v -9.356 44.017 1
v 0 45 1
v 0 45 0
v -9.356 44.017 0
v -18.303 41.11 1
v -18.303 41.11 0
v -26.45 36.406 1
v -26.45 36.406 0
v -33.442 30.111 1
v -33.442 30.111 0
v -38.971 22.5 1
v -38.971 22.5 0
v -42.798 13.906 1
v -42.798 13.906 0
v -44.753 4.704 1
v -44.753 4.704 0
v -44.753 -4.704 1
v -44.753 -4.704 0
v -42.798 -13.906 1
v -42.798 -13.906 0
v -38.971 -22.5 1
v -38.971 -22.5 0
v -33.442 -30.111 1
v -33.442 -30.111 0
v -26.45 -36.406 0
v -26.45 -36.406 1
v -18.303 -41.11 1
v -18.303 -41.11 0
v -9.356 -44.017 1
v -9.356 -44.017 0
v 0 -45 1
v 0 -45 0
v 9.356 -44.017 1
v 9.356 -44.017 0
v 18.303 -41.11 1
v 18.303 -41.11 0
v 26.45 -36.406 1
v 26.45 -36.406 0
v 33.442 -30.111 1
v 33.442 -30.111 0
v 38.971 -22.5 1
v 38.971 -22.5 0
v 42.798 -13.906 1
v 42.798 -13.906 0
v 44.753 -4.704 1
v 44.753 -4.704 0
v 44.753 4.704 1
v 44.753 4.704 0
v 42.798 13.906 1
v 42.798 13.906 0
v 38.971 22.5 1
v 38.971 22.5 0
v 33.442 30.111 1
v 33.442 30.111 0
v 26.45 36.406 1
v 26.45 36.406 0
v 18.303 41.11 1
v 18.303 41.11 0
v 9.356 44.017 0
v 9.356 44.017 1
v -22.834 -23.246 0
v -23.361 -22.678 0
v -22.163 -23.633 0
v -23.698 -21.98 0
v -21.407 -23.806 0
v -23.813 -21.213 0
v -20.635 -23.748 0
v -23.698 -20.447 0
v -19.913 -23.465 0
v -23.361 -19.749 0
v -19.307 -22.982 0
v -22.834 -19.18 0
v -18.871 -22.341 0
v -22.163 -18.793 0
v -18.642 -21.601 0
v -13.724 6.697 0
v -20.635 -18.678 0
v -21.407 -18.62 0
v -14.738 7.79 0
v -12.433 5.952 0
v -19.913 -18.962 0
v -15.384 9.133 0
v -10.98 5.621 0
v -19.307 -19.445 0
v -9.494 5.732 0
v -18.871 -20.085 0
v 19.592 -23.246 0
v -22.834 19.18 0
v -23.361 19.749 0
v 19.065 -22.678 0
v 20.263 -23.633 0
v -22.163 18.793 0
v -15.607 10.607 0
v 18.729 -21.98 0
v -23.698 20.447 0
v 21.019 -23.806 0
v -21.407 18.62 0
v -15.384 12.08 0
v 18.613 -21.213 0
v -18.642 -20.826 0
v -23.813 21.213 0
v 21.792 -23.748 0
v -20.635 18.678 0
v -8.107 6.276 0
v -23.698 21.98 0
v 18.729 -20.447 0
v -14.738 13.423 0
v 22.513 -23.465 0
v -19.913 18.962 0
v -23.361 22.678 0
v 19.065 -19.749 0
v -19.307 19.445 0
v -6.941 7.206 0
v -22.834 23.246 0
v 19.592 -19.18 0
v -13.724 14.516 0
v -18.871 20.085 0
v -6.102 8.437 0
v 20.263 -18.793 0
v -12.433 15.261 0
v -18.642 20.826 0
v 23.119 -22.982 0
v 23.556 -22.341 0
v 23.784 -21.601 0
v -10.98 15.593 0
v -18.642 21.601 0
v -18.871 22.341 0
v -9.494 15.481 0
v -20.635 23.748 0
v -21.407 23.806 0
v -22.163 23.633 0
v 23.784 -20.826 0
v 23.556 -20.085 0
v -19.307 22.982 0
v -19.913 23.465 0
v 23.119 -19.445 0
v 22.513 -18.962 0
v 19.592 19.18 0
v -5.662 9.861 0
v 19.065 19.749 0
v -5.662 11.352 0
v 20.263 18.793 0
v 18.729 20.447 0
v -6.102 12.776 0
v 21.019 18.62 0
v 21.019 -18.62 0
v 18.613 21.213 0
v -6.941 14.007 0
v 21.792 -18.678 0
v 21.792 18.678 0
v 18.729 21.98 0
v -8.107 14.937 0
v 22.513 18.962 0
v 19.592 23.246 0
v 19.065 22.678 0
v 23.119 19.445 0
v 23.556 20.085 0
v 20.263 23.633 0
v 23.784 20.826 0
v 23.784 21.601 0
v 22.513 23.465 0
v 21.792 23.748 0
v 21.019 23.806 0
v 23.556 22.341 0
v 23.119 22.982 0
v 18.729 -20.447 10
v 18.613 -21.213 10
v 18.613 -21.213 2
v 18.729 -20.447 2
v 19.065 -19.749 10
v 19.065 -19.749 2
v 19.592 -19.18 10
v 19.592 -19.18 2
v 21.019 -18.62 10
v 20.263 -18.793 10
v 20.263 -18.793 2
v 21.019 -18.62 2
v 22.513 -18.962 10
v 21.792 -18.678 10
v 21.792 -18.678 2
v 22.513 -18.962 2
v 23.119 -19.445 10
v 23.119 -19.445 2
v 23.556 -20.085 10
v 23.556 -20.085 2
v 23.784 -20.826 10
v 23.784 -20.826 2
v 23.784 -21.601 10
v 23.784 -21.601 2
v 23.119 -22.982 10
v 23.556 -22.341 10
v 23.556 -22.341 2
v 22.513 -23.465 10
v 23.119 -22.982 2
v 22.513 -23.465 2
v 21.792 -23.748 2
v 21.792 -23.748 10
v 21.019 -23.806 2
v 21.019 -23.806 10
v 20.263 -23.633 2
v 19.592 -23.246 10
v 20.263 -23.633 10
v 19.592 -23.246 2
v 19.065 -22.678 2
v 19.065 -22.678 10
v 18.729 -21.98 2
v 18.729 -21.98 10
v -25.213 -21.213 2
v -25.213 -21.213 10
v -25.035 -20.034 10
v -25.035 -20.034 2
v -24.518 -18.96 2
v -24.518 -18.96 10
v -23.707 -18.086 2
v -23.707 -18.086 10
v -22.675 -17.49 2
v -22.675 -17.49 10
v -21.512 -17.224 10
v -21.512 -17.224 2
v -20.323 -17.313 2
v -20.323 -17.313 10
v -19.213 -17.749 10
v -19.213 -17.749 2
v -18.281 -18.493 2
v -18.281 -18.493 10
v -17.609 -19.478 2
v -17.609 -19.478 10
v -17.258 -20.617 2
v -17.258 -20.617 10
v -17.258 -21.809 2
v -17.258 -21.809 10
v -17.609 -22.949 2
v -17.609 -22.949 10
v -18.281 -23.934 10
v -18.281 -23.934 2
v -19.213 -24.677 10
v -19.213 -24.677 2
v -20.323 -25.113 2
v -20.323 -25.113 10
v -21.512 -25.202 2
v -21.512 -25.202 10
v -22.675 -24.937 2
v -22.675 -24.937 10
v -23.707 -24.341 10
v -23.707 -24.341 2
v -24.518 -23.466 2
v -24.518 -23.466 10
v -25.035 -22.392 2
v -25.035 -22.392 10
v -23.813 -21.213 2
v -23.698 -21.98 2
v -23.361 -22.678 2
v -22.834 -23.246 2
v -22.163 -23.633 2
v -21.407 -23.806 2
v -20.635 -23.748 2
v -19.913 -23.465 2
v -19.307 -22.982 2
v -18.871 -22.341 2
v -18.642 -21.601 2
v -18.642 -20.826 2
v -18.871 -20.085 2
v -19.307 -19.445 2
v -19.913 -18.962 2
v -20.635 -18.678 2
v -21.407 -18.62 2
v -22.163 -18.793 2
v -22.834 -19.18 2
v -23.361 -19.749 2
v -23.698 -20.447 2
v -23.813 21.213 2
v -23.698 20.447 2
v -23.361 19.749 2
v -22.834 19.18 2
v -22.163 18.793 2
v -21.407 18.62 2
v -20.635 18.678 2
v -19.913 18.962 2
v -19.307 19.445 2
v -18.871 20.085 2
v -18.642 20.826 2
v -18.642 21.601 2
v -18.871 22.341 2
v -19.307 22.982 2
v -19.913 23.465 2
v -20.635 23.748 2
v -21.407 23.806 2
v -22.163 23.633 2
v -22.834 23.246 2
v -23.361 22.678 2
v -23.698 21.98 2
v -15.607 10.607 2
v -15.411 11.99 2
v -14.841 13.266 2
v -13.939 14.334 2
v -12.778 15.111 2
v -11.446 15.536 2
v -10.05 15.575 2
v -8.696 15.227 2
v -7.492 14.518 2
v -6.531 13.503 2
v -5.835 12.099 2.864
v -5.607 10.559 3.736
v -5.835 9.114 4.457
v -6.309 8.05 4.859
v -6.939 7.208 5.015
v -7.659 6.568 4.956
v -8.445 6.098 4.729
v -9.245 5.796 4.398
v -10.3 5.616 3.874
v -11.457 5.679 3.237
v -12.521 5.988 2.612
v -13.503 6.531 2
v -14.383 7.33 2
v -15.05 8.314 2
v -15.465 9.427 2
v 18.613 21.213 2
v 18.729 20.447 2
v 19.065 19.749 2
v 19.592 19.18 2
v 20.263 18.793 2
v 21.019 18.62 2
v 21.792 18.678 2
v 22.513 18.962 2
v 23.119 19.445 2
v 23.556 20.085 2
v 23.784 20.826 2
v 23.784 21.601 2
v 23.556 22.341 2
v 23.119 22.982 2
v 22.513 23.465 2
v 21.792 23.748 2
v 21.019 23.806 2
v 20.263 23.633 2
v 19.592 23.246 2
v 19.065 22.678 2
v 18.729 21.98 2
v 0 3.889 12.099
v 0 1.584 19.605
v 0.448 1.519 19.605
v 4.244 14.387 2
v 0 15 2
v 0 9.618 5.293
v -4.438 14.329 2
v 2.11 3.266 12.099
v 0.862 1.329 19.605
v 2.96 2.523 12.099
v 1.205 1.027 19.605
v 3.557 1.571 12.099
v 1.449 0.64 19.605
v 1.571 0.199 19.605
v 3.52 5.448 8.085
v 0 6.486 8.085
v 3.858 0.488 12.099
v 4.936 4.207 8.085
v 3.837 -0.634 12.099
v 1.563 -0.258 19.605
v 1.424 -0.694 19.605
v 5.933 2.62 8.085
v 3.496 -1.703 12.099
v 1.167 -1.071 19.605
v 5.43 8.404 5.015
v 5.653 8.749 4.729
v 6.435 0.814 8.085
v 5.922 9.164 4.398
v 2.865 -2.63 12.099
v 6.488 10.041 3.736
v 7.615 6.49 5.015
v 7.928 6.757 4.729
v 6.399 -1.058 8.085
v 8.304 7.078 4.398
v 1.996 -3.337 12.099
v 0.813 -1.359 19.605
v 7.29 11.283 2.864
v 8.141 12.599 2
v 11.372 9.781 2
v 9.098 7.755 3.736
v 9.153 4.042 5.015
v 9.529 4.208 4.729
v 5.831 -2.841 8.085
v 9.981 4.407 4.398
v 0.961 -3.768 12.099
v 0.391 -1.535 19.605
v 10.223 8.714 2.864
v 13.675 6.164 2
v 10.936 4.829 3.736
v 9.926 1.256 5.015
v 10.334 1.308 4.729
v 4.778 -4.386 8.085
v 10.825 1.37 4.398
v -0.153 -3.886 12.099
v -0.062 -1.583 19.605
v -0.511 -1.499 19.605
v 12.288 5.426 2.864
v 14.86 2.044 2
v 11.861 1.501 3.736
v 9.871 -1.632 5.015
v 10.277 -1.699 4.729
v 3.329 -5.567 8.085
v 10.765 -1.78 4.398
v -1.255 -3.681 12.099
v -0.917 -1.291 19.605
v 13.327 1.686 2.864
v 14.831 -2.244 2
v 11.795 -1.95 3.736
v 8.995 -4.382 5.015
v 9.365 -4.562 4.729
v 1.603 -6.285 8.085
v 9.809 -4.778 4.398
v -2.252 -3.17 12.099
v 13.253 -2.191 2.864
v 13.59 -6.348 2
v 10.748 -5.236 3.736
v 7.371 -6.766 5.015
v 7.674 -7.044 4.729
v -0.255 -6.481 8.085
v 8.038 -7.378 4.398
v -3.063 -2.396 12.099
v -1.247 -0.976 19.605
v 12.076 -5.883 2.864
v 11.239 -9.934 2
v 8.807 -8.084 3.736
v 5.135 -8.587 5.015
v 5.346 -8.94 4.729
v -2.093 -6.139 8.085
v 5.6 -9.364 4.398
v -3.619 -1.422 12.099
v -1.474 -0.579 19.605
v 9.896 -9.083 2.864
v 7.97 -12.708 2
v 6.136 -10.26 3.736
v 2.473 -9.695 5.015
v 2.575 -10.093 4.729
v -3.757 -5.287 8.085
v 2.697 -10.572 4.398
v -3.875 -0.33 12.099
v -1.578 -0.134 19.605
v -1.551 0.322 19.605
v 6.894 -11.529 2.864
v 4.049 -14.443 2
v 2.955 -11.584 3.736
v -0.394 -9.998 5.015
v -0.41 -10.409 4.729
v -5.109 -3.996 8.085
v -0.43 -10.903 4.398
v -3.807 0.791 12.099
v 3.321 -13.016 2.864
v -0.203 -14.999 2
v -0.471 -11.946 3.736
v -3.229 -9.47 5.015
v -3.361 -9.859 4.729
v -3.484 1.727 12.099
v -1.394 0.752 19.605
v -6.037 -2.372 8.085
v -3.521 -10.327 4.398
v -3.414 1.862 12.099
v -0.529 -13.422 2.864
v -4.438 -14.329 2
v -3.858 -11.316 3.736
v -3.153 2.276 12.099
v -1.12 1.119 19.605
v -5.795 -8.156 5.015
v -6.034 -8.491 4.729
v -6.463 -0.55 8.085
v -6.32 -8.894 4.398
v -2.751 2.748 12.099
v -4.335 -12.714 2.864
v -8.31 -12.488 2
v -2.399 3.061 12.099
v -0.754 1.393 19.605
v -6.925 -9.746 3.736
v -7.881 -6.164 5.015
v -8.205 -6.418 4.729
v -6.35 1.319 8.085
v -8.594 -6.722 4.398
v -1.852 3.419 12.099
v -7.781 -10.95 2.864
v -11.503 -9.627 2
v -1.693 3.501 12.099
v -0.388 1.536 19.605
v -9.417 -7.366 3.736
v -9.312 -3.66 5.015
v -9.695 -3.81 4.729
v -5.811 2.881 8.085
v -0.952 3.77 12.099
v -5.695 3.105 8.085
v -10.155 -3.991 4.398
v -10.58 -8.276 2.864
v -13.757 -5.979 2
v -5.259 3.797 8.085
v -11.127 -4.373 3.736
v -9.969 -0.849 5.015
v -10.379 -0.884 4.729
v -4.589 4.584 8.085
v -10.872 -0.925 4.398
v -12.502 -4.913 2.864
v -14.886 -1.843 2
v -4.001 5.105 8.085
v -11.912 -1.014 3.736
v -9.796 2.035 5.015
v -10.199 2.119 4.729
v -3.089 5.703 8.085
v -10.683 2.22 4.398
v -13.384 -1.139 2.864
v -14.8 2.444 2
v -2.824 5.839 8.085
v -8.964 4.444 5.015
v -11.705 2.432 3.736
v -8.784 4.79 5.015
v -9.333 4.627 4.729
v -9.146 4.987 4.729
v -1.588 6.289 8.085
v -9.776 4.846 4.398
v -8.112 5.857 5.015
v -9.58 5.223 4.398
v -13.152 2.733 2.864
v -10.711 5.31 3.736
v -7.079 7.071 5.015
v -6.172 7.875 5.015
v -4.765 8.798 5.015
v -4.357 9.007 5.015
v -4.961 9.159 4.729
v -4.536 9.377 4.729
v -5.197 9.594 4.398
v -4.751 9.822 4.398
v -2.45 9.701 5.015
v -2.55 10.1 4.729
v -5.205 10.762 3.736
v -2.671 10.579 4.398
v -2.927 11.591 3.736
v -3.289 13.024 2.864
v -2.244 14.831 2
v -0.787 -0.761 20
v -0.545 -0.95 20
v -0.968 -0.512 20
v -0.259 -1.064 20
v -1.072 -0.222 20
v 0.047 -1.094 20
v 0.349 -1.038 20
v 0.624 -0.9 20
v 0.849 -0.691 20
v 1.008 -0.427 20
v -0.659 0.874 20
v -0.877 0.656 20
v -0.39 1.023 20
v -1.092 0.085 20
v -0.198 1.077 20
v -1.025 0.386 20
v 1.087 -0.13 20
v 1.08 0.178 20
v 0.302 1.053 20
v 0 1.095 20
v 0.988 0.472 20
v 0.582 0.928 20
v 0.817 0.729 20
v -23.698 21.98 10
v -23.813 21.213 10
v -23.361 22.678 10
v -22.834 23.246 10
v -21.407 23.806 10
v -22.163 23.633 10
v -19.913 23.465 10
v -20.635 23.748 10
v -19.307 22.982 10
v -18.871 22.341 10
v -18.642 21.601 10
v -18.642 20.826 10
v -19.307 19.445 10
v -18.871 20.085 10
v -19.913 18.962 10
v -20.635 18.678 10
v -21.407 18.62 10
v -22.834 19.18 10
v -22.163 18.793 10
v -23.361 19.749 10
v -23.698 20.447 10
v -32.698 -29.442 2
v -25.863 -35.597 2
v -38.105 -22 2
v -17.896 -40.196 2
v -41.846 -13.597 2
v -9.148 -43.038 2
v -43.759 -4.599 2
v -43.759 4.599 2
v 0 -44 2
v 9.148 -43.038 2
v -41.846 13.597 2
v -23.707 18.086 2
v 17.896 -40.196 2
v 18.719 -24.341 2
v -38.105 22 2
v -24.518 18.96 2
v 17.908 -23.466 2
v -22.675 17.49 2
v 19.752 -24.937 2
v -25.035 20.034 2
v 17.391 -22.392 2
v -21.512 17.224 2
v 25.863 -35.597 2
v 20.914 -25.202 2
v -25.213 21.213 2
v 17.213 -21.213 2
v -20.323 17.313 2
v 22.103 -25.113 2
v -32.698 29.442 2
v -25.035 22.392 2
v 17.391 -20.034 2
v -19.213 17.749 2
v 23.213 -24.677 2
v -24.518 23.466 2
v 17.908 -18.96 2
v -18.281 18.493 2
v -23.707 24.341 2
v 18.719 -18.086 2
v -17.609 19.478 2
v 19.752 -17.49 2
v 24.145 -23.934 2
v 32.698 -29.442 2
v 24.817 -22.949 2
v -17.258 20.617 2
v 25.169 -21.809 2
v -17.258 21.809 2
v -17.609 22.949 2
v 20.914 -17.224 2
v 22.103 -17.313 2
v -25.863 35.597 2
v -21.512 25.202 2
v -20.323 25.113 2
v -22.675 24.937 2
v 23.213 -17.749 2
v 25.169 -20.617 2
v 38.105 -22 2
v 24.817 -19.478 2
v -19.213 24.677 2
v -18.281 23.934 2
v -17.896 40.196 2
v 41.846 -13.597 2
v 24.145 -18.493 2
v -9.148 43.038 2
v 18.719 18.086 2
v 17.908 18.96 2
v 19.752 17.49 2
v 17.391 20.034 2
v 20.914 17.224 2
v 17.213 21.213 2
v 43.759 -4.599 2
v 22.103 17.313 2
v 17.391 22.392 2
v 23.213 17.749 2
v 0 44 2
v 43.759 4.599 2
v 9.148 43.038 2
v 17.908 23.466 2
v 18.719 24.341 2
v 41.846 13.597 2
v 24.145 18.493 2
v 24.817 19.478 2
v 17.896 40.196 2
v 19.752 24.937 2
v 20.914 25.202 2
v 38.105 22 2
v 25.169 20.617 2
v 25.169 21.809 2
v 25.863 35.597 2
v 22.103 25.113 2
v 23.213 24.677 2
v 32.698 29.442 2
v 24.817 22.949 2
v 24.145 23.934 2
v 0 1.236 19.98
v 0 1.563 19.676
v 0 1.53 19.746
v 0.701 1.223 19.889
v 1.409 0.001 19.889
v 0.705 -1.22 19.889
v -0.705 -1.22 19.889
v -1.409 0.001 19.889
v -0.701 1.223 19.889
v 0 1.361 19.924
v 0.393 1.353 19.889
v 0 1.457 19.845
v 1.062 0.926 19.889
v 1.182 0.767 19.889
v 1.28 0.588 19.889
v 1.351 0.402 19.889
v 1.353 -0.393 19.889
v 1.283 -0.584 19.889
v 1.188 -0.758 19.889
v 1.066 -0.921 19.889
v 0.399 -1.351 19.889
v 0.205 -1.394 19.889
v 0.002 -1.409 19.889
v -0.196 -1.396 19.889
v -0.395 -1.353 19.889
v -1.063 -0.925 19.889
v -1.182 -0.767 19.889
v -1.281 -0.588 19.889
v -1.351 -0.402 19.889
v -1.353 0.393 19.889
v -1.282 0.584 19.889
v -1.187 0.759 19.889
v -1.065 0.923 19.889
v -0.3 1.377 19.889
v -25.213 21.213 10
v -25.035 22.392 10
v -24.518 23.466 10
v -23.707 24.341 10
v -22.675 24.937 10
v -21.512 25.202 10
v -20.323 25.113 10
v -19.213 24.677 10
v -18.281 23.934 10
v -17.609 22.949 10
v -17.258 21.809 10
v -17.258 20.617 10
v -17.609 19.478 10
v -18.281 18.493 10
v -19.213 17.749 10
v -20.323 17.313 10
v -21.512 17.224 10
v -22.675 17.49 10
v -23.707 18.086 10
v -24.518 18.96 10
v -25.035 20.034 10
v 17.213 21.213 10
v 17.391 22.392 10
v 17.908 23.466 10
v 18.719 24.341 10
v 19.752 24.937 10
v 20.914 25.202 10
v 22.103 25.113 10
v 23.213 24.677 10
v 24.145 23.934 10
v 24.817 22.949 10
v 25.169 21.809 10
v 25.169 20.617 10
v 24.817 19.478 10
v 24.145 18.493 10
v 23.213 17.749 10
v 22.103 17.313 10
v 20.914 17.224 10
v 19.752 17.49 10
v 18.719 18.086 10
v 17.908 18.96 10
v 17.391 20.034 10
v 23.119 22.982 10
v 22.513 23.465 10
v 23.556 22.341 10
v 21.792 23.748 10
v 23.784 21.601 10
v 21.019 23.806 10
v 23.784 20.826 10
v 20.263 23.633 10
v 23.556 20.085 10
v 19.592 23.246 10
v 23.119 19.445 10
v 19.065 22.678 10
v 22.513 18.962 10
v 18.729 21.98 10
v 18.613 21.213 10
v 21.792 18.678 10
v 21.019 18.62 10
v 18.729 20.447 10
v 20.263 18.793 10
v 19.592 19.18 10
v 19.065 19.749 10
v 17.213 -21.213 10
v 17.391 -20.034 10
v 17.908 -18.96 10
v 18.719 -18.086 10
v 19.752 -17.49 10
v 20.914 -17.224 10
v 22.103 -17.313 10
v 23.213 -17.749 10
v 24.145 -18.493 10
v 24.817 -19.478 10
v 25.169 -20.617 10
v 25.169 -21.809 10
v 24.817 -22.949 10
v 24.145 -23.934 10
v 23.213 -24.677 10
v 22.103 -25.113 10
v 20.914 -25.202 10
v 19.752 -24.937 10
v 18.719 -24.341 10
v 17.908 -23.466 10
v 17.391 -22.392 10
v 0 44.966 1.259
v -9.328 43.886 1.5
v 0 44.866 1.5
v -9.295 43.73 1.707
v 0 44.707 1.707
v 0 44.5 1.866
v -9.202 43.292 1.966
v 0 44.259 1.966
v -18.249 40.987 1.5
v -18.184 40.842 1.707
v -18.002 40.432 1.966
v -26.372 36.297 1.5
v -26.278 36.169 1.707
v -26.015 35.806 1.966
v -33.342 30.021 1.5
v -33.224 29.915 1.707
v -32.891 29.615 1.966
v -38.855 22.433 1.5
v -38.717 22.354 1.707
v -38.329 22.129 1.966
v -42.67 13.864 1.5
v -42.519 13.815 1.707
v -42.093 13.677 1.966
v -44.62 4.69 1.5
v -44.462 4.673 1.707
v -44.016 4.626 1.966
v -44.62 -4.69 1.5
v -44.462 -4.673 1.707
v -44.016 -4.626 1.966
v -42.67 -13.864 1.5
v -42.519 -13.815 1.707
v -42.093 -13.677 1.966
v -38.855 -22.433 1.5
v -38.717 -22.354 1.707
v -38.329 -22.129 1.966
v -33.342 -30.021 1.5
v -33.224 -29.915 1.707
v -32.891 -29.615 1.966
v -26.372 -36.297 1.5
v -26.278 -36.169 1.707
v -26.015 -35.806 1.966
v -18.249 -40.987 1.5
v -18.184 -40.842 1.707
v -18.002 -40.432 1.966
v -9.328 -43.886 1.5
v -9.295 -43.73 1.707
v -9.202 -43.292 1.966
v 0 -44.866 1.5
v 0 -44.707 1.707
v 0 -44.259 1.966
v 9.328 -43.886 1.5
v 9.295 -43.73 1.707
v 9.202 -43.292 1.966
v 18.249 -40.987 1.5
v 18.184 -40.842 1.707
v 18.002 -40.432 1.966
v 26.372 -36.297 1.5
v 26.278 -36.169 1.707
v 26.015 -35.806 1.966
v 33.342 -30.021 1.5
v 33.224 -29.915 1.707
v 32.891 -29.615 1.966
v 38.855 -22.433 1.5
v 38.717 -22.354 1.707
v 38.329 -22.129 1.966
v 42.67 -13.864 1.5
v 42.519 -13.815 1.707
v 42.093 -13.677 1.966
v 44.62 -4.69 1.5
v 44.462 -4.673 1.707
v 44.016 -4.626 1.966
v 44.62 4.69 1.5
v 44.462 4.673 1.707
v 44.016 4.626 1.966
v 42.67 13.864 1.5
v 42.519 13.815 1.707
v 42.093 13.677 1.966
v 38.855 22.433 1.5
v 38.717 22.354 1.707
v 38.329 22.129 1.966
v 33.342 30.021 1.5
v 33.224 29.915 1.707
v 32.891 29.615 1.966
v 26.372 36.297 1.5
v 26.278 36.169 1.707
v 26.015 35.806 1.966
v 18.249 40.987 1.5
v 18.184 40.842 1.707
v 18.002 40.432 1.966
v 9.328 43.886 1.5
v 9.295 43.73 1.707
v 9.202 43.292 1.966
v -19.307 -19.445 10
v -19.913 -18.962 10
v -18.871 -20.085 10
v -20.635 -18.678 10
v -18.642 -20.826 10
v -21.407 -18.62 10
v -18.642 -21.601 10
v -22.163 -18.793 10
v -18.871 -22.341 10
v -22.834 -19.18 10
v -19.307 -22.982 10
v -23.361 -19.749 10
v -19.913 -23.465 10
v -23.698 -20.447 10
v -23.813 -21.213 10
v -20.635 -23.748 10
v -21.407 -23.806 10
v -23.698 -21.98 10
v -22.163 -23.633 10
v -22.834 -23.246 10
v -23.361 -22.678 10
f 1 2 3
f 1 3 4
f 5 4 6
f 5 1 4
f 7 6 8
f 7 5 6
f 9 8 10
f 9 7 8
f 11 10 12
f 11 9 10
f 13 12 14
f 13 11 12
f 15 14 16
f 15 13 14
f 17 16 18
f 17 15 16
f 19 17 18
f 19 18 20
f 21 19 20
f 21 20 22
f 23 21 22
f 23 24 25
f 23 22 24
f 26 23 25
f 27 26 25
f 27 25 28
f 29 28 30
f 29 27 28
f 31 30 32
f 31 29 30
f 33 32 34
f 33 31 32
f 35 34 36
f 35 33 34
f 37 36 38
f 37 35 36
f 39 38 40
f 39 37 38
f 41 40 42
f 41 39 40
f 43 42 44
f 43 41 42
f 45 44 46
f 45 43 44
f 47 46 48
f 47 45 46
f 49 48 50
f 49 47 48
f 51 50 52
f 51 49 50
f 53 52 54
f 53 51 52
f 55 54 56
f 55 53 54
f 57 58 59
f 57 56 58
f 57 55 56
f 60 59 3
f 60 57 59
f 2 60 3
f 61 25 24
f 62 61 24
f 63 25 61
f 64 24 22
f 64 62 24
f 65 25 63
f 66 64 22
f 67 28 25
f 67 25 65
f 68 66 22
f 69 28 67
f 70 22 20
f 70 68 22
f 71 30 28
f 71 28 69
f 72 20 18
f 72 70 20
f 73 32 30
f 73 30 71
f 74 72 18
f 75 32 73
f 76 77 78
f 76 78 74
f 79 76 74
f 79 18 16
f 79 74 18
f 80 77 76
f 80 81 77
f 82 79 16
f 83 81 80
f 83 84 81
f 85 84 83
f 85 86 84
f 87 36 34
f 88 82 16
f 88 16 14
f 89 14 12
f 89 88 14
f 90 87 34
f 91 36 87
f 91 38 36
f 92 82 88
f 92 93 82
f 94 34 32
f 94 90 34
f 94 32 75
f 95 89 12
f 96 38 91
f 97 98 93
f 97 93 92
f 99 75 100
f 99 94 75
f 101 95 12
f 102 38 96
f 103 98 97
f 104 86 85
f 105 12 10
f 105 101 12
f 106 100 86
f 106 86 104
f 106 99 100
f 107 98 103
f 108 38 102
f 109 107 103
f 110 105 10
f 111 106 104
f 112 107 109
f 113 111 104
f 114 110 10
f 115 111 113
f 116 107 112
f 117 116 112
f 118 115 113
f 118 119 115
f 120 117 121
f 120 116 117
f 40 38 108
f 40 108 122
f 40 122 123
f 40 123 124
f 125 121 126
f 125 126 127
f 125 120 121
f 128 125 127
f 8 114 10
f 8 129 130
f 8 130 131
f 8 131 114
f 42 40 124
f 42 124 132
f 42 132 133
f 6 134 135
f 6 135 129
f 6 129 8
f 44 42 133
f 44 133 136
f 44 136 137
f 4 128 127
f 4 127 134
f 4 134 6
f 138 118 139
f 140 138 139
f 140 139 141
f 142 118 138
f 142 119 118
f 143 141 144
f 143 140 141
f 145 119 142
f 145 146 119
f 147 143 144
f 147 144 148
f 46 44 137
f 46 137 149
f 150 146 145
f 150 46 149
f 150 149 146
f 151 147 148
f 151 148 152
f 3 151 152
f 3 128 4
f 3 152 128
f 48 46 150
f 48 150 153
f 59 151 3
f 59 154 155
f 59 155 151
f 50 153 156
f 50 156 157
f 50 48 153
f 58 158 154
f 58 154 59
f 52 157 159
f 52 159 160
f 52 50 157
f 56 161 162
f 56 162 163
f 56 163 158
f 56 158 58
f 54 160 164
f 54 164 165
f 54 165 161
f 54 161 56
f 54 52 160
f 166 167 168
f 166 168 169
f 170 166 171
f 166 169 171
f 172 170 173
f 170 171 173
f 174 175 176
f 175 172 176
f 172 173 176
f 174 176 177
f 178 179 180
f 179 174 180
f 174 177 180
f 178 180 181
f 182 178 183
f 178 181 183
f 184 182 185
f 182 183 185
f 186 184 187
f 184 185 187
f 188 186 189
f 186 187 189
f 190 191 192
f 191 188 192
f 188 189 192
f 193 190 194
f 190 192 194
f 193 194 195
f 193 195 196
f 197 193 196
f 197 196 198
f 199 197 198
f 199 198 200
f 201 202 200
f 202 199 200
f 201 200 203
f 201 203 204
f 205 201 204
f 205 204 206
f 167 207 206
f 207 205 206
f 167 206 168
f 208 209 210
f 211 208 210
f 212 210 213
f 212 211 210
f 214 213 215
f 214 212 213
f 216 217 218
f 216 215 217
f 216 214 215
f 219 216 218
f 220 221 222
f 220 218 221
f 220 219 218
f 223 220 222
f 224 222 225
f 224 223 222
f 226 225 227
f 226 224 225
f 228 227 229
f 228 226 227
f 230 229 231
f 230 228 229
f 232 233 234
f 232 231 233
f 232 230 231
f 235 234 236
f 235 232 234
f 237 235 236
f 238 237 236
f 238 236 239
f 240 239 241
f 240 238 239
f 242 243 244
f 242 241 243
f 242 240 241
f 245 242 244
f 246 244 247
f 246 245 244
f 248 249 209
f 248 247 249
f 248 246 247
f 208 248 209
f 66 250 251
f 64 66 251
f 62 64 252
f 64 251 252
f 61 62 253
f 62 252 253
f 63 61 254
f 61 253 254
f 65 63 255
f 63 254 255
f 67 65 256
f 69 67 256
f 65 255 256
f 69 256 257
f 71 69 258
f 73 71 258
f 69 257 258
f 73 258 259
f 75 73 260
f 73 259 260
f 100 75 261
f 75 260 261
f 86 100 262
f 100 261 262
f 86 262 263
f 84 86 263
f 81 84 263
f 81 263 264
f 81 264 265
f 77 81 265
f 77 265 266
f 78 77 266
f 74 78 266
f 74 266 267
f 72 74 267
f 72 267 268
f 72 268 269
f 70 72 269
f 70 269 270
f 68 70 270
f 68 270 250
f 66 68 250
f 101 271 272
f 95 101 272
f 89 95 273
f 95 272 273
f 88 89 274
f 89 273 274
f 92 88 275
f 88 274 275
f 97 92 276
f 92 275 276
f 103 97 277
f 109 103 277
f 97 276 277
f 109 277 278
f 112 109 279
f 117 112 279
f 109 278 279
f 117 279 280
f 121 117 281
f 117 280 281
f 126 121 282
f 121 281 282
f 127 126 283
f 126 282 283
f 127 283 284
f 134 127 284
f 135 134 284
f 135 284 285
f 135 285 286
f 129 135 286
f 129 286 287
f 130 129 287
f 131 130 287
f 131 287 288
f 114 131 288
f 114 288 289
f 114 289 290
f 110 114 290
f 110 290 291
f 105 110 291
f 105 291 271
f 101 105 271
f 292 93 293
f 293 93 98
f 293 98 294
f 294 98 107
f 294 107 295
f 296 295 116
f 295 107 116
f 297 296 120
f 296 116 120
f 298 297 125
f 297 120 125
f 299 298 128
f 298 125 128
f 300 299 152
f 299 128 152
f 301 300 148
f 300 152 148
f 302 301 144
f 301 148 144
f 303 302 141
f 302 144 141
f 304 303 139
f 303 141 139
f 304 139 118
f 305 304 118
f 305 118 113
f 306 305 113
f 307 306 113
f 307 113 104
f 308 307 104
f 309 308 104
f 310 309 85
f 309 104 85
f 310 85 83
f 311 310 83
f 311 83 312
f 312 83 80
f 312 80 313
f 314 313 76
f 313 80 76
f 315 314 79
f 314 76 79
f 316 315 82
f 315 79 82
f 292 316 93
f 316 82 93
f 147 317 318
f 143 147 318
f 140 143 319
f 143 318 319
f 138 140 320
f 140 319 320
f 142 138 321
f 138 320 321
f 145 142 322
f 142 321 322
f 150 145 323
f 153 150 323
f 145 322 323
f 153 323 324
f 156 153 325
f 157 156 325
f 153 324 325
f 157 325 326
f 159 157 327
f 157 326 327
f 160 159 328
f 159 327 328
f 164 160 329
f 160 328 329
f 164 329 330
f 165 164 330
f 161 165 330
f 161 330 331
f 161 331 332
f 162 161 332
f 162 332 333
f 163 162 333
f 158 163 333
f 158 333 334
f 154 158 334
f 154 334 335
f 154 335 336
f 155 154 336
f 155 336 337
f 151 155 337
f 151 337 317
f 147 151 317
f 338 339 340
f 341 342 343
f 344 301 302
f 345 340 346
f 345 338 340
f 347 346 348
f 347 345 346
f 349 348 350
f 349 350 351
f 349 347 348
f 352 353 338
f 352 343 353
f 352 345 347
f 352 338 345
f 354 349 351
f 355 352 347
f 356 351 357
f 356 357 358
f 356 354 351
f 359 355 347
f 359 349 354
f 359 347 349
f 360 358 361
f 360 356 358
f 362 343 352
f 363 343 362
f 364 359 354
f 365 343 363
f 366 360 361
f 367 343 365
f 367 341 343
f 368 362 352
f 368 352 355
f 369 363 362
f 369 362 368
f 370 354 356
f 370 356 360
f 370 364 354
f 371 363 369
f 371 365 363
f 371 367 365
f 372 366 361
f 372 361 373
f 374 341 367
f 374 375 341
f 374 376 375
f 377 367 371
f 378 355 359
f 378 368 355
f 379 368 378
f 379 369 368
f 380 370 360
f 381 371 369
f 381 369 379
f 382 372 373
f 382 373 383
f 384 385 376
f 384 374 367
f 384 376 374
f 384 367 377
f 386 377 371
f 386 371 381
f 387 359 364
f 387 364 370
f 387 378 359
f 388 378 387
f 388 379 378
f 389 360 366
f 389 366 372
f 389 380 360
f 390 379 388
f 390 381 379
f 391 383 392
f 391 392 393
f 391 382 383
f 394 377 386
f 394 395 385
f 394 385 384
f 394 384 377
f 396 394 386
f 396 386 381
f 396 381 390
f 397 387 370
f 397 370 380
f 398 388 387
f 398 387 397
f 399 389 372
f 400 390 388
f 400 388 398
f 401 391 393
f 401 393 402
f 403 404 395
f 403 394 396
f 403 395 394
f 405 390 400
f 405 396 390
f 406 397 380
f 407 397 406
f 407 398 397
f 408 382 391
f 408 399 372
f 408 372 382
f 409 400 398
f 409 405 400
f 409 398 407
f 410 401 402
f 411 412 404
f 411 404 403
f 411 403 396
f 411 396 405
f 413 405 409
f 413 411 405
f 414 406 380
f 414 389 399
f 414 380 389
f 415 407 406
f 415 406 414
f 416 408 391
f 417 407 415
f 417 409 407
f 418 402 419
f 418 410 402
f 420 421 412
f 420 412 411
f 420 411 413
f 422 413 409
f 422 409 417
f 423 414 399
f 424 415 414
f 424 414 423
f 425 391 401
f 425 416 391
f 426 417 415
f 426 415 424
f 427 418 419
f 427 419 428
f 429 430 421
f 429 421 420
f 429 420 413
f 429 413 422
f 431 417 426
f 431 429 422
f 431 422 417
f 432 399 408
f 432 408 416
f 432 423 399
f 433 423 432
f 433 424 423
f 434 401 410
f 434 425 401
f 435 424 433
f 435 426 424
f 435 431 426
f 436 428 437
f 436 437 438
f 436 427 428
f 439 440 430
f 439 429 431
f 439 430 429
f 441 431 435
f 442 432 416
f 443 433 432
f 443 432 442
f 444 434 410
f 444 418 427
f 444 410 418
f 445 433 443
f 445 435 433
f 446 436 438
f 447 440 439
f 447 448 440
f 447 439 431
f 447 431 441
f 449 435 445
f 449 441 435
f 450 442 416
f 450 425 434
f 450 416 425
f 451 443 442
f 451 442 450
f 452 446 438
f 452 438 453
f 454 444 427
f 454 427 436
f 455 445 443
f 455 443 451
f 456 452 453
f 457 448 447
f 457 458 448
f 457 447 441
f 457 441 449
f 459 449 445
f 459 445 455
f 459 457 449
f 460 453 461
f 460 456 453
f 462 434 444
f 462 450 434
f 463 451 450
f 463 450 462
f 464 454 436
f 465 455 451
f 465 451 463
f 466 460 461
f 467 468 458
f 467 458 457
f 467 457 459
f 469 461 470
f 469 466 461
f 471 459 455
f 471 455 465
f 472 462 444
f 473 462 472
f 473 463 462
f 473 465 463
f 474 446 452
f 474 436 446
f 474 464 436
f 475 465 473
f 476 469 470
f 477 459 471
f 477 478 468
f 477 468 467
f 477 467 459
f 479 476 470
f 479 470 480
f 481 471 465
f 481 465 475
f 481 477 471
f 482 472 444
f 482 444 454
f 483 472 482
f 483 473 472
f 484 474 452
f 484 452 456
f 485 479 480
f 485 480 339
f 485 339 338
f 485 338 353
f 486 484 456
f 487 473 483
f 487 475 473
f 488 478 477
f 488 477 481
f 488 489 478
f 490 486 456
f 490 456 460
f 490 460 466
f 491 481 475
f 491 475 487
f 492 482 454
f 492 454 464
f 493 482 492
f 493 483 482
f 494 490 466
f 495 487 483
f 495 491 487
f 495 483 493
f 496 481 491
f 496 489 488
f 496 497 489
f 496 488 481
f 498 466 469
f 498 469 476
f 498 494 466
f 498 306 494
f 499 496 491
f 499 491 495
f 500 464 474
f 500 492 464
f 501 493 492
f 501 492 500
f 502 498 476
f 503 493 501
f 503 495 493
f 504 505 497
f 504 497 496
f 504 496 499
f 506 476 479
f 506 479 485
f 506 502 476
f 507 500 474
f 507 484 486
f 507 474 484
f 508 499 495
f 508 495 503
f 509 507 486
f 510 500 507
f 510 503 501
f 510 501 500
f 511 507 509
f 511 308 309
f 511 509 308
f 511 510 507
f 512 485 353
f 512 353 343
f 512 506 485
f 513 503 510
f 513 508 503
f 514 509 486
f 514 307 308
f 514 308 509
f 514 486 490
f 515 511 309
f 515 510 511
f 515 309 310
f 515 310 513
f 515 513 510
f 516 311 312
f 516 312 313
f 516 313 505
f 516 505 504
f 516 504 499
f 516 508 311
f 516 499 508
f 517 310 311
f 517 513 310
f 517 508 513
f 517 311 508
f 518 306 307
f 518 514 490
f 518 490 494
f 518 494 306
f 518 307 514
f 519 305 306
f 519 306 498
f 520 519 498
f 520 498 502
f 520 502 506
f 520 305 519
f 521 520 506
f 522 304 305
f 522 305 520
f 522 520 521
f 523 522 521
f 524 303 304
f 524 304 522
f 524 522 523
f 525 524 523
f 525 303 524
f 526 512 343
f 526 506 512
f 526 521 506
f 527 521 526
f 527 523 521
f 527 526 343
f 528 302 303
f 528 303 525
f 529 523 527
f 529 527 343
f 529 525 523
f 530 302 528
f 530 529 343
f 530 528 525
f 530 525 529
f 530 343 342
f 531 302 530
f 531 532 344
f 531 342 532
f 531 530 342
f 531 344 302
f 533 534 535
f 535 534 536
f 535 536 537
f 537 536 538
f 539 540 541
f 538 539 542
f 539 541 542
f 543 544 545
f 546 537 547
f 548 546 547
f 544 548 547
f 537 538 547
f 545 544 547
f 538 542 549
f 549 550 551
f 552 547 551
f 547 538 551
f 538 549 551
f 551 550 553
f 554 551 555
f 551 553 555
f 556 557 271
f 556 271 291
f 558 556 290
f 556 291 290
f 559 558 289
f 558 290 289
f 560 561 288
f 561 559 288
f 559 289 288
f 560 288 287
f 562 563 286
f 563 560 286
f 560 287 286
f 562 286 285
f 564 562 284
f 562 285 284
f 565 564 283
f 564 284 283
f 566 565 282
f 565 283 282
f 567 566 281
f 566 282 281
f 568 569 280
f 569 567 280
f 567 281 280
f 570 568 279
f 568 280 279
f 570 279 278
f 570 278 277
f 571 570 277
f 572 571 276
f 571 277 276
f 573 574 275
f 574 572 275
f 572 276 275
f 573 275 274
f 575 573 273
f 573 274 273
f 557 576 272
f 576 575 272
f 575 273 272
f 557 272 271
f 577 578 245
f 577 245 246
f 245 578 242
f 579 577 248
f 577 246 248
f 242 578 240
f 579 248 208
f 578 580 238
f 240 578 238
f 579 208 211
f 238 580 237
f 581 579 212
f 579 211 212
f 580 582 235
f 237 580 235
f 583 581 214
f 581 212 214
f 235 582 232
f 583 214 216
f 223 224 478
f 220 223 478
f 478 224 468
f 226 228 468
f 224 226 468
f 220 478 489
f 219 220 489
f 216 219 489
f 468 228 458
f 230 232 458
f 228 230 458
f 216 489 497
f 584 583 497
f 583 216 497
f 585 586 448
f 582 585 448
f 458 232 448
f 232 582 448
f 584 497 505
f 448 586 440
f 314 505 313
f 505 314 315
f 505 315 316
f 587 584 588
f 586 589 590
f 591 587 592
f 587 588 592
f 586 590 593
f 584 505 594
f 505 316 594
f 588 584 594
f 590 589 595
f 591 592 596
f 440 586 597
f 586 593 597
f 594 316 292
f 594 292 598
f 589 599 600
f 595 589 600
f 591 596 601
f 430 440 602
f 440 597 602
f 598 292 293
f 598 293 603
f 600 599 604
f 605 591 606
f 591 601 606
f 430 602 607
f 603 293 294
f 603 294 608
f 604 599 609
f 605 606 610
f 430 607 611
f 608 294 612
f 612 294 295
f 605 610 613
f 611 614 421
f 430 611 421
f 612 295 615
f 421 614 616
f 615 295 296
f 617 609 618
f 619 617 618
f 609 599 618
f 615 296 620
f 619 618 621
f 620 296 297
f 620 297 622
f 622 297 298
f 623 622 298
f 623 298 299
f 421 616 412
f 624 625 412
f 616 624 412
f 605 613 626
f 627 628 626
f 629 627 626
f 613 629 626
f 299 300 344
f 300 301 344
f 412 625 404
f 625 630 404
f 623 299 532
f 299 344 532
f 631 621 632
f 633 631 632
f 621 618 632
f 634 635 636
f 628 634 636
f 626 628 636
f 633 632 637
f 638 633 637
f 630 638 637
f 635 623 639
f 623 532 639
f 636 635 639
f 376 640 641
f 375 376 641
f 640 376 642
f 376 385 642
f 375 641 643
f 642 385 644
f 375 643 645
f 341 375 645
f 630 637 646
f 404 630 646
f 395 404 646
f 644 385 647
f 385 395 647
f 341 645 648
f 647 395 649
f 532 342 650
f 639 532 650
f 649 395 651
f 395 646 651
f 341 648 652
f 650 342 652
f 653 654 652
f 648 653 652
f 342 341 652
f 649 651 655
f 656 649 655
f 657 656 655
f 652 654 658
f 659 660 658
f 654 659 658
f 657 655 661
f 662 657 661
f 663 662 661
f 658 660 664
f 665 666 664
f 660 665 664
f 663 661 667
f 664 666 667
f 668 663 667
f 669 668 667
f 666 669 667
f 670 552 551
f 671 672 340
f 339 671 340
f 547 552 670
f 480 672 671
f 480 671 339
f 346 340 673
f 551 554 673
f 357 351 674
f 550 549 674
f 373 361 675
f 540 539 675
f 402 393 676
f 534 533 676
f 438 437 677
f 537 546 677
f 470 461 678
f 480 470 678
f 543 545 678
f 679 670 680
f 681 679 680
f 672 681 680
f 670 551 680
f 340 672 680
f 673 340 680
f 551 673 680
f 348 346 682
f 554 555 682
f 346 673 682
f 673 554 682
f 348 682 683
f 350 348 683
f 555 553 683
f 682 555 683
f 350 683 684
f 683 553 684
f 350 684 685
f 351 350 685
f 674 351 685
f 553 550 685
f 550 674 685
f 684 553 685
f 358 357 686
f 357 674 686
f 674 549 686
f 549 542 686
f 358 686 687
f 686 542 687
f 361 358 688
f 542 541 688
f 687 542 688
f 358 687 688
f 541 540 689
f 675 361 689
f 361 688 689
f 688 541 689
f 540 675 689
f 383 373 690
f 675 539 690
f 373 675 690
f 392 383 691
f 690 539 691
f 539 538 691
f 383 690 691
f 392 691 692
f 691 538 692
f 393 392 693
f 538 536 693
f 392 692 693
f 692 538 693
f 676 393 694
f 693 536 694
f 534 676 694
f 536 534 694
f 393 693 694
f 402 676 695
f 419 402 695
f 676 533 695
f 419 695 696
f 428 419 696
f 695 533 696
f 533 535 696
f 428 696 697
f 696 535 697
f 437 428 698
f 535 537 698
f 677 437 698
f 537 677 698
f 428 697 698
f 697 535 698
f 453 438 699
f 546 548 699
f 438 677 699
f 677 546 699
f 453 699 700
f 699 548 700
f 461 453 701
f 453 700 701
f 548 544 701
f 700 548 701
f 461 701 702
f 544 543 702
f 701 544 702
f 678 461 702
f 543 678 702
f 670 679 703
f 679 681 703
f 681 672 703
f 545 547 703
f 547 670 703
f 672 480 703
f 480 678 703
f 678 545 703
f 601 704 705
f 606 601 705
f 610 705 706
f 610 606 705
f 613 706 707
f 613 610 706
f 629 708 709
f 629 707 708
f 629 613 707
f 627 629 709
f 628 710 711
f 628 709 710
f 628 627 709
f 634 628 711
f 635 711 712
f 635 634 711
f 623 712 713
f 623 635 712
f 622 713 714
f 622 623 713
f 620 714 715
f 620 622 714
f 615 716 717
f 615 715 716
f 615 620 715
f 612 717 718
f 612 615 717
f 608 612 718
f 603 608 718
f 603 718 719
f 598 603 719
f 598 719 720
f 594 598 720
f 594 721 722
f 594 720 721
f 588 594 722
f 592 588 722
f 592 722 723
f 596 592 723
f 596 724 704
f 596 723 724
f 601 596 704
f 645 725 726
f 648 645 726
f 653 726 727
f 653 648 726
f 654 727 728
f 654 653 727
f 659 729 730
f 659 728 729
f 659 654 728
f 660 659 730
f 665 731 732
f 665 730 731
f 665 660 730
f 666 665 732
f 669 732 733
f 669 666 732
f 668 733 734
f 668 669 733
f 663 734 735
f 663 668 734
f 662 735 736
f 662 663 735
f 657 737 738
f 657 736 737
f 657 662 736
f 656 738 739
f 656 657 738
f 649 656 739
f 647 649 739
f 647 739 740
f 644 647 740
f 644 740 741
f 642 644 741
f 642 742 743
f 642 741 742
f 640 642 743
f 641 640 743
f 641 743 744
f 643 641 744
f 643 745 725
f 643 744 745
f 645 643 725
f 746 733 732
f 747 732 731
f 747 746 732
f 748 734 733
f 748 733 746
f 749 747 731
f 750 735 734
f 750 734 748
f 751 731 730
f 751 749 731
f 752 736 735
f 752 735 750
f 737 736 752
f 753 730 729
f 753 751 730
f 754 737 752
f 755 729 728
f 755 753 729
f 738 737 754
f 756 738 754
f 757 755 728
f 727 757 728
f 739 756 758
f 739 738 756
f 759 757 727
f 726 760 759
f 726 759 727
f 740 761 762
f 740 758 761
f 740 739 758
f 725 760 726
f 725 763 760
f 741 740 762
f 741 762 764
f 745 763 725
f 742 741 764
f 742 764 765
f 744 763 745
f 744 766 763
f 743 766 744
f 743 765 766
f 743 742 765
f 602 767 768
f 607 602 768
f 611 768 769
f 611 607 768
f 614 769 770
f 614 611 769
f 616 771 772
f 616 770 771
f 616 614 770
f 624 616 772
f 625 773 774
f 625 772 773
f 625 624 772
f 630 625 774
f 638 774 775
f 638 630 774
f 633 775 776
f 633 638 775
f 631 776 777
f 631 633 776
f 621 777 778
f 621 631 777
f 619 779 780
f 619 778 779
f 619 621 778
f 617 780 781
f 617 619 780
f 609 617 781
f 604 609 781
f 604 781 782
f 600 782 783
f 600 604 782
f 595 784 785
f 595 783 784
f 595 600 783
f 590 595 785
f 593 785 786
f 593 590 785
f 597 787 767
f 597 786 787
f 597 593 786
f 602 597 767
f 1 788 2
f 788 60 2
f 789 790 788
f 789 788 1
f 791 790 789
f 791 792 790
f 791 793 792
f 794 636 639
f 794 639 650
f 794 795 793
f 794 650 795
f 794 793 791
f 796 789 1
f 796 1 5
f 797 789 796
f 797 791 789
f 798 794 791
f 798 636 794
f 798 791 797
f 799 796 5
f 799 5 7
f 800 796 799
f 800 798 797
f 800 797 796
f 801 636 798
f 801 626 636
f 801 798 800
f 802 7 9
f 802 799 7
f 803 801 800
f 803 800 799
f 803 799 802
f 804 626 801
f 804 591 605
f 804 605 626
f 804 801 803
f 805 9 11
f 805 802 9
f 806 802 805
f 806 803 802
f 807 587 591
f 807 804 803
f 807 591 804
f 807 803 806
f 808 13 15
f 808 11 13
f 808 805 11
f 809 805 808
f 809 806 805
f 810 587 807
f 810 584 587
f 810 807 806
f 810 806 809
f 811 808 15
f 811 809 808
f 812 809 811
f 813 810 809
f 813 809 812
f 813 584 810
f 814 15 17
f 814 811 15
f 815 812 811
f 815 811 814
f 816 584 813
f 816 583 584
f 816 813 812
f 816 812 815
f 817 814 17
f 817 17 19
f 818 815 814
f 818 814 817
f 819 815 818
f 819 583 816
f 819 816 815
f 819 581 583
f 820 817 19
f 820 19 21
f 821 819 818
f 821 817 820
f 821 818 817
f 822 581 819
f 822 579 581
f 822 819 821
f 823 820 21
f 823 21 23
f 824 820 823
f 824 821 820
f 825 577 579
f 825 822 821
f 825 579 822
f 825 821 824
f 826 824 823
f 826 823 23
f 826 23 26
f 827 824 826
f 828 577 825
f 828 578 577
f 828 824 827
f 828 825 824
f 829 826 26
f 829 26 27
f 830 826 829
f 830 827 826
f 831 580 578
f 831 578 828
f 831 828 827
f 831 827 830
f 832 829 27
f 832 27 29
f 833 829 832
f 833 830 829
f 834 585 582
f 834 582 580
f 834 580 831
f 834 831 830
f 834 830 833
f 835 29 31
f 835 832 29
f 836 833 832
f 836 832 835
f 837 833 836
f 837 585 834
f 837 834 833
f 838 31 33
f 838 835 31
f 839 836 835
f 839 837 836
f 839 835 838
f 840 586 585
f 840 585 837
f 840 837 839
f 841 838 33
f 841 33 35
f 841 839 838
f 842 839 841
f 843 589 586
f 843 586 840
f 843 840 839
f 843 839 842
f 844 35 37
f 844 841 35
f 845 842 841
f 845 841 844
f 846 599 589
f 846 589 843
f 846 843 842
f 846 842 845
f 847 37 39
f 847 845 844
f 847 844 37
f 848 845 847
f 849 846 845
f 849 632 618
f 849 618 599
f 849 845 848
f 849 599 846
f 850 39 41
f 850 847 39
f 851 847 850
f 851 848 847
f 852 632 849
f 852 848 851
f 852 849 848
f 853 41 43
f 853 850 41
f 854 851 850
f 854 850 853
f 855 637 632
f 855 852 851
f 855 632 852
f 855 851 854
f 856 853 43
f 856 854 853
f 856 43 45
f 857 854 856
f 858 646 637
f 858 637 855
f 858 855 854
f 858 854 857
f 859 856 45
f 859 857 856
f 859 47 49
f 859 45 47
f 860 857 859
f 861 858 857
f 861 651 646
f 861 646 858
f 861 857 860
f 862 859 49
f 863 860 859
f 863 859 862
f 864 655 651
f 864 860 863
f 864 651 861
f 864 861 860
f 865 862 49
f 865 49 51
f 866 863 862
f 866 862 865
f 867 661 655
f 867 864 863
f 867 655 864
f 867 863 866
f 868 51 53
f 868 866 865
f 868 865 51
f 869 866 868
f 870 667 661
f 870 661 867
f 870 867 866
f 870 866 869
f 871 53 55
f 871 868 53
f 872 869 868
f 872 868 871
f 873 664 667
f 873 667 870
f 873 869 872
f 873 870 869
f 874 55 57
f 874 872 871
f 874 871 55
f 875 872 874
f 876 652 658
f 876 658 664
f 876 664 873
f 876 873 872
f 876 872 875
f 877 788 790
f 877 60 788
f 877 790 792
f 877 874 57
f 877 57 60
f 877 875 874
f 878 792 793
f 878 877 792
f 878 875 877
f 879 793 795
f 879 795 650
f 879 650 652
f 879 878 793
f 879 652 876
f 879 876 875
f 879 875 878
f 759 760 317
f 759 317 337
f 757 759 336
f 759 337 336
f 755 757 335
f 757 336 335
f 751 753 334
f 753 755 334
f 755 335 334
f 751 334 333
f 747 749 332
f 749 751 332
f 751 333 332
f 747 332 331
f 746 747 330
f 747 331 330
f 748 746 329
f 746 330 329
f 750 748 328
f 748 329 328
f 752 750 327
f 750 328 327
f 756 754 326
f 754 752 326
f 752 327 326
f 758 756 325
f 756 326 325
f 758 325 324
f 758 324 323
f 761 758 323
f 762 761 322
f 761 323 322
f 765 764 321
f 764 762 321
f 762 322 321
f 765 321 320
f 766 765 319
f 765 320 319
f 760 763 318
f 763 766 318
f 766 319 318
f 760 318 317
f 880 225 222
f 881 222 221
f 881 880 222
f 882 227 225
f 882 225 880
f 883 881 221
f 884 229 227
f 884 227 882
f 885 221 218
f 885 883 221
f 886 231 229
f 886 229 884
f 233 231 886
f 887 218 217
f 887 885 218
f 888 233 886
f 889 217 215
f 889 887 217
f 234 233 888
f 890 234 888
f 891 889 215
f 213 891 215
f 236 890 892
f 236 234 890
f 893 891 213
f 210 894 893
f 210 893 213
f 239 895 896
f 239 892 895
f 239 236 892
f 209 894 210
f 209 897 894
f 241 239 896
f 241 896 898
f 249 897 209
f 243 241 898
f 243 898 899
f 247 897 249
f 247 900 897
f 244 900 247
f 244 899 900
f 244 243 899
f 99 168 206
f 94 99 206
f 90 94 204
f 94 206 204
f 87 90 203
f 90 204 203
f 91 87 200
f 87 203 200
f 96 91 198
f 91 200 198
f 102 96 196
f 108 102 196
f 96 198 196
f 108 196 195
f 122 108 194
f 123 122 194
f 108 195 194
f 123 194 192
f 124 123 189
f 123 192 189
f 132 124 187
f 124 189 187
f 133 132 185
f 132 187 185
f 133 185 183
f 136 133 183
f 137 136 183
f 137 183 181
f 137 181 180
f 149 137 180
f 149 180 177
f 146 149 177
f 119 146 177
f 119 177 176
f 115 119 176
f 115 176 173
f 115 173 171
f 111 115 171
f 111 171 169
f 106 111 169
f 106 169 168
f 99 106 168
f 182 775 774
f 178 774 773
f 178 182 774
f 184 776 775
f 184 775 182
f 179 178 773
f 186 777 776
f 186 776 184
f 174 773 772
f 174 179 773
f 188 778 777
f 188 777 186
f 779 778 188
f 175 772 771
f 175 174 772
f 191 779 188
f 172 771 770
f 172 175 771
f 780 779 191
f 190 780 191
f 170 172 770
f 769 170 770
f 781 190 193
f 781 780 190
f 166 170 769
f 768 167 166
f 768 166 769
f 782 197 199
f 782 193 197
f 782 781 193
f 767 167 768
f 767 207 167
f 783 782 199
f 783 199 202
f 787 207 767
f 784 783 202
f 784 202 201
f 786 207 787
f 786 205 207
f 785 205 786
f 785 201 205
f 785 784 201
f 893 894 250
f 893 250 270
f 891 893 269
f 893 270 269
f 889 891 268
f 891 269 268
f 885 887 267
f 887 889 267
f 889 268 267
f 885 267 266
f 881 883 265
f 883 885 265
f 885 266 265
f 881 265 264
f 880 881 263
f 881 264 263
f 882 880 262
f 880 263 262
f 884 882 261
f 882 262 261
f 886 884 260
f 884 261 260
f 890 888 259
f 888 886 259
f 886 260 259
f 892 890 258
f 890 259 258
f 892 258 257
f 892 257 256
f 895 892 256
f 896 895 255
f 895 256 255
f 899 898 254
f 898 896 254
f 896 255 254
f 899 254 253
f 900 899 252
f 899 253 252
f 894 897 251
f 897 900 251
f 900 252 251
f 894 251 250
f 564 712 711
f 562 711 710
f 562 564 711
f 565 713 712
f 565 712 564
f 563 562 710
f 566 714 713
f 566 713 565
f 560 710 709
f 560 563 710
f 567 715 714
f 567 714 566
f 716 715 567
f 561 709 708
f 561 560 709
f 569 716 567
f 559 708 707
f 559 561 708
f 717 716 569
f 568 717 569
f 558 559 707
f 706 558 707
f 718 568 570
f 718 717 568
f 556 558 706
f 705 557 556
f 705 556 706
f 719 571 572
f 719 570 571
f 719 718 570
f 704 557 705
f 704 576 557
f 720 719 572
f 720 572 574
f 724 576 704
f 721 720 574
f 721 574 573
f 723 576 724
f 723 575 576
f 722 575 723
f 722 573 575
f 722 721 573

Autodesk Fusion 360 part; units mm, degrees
sketch "Sketch1" plane through (0, 0, 0) normal (1, 0, 0) x (0, 1, 0)
  line L0 (0, 80) -> (0, -40) construction
  line L1 (0, 0) -> (45, 0)
  line L2 (45, 0) -> (45, 1)
  line L3 (0, 0) -> (0, 20) construction
  line L4 (0, 20) -> (1.5, 20)
  line L5 (44, 2) -> (15, 2)
  spline S0 degree 2 poles (1.5, 20) (4.0396, 7.8722) (15, 2) knots 0 0 0 2.340033 2.340033 2.340033 weights 1 1.582771 1
  arc A0 (45, 1) -> (44, 2) centre (44, 1) ccw
  line L6 (0, 20) -> (0, 0) construction
  line L7 (0, 20) -> (0, 0)
  point P0 (45, 2)
  dimension "d1" = 120
  dimension "d2" = 45
  dimension "d3" = 2
  dimension "d4" = 20
  dimension "d5" = 1.5
  dimension "d6" = 30
  dimension "d7" = 1
revolve "Revolve1" add sketch "Sketch1" angle 360 about axis through (0, 0, 20) along (0, 0, -1)
fillet "Fillet1" radius 0.5 1 edges at (-1.3985, 0.5424, 20)
sketch "Sketch2" plane through (0, 0, 2) normal (0, 0, 1) x (-1, 0, 0)
  circle A0 centre (0, 0) radius 15
  circle A1 centre (0, 0) radius 44
  circle A2 centre (0, 0) radius 30 construction
  line L0 (0, 0) -> (25, 25) construction
  line L1 (0, 0) -> (-21.2132, -21.2132) construction
  line L2 (0, 0) -> (-22.657, 22.657) construction
  line L3 (0, 0) -> (23.9132, -23.9132) construction
  circle A3 centre (21.2132, -21.2132) radius 4
  circle A4 centre (-21.2132, -21.2132) radius 4
  circle A5 centre (21.2132, 21.2132) radius 4
  circle A6 centre (-21.2132, 21.2132) radius 4
  circle A7 centre (21.2132, -21.2132) radius 2.6
  circle A8 centre (-21.2132, -21.2132) radius 2.6
  circle A9 centre (-21.2132, 21.2132) radius 2.6
  circle A10 centre (21.2132, 21.2132) radius 2.6
  circle A11 centre (10.6066, -10.6066) radius 5
  dimension "d11" = 60
  dimension "d12" = 35.3553
  dimension "d13" = 30
  dimension "d14" = 32.0419
  dimension "d15" = 33.8184
  dimension "d16" = 8
  dimension "d17" = 8
  dimension "d18" = 8
  dimension "d19" = 8
  dimension "d20" = 5.2
  dimension "d21" = 5.2
  dimension "d22" = 5.2
  dimension "d23" = 5.2
  dimension "d31" = 10
  dimension "d34" = 15
extrude "Extrude3" add sketch "Sketch2" along normal blind 8 contours A3 | A4 | A5 | A6
extrude "Extrude2" cut sketch "Sketch2" against normal blind 5 contours A7 | A8 | A9 | A10
extrude "Extrude4" cut sketch "Sketch2" along normal mid plane 18 contours A0 A11 | A0 A11 picked at (9.3285, -9.5024) picked at (11.819, -11.7173)
